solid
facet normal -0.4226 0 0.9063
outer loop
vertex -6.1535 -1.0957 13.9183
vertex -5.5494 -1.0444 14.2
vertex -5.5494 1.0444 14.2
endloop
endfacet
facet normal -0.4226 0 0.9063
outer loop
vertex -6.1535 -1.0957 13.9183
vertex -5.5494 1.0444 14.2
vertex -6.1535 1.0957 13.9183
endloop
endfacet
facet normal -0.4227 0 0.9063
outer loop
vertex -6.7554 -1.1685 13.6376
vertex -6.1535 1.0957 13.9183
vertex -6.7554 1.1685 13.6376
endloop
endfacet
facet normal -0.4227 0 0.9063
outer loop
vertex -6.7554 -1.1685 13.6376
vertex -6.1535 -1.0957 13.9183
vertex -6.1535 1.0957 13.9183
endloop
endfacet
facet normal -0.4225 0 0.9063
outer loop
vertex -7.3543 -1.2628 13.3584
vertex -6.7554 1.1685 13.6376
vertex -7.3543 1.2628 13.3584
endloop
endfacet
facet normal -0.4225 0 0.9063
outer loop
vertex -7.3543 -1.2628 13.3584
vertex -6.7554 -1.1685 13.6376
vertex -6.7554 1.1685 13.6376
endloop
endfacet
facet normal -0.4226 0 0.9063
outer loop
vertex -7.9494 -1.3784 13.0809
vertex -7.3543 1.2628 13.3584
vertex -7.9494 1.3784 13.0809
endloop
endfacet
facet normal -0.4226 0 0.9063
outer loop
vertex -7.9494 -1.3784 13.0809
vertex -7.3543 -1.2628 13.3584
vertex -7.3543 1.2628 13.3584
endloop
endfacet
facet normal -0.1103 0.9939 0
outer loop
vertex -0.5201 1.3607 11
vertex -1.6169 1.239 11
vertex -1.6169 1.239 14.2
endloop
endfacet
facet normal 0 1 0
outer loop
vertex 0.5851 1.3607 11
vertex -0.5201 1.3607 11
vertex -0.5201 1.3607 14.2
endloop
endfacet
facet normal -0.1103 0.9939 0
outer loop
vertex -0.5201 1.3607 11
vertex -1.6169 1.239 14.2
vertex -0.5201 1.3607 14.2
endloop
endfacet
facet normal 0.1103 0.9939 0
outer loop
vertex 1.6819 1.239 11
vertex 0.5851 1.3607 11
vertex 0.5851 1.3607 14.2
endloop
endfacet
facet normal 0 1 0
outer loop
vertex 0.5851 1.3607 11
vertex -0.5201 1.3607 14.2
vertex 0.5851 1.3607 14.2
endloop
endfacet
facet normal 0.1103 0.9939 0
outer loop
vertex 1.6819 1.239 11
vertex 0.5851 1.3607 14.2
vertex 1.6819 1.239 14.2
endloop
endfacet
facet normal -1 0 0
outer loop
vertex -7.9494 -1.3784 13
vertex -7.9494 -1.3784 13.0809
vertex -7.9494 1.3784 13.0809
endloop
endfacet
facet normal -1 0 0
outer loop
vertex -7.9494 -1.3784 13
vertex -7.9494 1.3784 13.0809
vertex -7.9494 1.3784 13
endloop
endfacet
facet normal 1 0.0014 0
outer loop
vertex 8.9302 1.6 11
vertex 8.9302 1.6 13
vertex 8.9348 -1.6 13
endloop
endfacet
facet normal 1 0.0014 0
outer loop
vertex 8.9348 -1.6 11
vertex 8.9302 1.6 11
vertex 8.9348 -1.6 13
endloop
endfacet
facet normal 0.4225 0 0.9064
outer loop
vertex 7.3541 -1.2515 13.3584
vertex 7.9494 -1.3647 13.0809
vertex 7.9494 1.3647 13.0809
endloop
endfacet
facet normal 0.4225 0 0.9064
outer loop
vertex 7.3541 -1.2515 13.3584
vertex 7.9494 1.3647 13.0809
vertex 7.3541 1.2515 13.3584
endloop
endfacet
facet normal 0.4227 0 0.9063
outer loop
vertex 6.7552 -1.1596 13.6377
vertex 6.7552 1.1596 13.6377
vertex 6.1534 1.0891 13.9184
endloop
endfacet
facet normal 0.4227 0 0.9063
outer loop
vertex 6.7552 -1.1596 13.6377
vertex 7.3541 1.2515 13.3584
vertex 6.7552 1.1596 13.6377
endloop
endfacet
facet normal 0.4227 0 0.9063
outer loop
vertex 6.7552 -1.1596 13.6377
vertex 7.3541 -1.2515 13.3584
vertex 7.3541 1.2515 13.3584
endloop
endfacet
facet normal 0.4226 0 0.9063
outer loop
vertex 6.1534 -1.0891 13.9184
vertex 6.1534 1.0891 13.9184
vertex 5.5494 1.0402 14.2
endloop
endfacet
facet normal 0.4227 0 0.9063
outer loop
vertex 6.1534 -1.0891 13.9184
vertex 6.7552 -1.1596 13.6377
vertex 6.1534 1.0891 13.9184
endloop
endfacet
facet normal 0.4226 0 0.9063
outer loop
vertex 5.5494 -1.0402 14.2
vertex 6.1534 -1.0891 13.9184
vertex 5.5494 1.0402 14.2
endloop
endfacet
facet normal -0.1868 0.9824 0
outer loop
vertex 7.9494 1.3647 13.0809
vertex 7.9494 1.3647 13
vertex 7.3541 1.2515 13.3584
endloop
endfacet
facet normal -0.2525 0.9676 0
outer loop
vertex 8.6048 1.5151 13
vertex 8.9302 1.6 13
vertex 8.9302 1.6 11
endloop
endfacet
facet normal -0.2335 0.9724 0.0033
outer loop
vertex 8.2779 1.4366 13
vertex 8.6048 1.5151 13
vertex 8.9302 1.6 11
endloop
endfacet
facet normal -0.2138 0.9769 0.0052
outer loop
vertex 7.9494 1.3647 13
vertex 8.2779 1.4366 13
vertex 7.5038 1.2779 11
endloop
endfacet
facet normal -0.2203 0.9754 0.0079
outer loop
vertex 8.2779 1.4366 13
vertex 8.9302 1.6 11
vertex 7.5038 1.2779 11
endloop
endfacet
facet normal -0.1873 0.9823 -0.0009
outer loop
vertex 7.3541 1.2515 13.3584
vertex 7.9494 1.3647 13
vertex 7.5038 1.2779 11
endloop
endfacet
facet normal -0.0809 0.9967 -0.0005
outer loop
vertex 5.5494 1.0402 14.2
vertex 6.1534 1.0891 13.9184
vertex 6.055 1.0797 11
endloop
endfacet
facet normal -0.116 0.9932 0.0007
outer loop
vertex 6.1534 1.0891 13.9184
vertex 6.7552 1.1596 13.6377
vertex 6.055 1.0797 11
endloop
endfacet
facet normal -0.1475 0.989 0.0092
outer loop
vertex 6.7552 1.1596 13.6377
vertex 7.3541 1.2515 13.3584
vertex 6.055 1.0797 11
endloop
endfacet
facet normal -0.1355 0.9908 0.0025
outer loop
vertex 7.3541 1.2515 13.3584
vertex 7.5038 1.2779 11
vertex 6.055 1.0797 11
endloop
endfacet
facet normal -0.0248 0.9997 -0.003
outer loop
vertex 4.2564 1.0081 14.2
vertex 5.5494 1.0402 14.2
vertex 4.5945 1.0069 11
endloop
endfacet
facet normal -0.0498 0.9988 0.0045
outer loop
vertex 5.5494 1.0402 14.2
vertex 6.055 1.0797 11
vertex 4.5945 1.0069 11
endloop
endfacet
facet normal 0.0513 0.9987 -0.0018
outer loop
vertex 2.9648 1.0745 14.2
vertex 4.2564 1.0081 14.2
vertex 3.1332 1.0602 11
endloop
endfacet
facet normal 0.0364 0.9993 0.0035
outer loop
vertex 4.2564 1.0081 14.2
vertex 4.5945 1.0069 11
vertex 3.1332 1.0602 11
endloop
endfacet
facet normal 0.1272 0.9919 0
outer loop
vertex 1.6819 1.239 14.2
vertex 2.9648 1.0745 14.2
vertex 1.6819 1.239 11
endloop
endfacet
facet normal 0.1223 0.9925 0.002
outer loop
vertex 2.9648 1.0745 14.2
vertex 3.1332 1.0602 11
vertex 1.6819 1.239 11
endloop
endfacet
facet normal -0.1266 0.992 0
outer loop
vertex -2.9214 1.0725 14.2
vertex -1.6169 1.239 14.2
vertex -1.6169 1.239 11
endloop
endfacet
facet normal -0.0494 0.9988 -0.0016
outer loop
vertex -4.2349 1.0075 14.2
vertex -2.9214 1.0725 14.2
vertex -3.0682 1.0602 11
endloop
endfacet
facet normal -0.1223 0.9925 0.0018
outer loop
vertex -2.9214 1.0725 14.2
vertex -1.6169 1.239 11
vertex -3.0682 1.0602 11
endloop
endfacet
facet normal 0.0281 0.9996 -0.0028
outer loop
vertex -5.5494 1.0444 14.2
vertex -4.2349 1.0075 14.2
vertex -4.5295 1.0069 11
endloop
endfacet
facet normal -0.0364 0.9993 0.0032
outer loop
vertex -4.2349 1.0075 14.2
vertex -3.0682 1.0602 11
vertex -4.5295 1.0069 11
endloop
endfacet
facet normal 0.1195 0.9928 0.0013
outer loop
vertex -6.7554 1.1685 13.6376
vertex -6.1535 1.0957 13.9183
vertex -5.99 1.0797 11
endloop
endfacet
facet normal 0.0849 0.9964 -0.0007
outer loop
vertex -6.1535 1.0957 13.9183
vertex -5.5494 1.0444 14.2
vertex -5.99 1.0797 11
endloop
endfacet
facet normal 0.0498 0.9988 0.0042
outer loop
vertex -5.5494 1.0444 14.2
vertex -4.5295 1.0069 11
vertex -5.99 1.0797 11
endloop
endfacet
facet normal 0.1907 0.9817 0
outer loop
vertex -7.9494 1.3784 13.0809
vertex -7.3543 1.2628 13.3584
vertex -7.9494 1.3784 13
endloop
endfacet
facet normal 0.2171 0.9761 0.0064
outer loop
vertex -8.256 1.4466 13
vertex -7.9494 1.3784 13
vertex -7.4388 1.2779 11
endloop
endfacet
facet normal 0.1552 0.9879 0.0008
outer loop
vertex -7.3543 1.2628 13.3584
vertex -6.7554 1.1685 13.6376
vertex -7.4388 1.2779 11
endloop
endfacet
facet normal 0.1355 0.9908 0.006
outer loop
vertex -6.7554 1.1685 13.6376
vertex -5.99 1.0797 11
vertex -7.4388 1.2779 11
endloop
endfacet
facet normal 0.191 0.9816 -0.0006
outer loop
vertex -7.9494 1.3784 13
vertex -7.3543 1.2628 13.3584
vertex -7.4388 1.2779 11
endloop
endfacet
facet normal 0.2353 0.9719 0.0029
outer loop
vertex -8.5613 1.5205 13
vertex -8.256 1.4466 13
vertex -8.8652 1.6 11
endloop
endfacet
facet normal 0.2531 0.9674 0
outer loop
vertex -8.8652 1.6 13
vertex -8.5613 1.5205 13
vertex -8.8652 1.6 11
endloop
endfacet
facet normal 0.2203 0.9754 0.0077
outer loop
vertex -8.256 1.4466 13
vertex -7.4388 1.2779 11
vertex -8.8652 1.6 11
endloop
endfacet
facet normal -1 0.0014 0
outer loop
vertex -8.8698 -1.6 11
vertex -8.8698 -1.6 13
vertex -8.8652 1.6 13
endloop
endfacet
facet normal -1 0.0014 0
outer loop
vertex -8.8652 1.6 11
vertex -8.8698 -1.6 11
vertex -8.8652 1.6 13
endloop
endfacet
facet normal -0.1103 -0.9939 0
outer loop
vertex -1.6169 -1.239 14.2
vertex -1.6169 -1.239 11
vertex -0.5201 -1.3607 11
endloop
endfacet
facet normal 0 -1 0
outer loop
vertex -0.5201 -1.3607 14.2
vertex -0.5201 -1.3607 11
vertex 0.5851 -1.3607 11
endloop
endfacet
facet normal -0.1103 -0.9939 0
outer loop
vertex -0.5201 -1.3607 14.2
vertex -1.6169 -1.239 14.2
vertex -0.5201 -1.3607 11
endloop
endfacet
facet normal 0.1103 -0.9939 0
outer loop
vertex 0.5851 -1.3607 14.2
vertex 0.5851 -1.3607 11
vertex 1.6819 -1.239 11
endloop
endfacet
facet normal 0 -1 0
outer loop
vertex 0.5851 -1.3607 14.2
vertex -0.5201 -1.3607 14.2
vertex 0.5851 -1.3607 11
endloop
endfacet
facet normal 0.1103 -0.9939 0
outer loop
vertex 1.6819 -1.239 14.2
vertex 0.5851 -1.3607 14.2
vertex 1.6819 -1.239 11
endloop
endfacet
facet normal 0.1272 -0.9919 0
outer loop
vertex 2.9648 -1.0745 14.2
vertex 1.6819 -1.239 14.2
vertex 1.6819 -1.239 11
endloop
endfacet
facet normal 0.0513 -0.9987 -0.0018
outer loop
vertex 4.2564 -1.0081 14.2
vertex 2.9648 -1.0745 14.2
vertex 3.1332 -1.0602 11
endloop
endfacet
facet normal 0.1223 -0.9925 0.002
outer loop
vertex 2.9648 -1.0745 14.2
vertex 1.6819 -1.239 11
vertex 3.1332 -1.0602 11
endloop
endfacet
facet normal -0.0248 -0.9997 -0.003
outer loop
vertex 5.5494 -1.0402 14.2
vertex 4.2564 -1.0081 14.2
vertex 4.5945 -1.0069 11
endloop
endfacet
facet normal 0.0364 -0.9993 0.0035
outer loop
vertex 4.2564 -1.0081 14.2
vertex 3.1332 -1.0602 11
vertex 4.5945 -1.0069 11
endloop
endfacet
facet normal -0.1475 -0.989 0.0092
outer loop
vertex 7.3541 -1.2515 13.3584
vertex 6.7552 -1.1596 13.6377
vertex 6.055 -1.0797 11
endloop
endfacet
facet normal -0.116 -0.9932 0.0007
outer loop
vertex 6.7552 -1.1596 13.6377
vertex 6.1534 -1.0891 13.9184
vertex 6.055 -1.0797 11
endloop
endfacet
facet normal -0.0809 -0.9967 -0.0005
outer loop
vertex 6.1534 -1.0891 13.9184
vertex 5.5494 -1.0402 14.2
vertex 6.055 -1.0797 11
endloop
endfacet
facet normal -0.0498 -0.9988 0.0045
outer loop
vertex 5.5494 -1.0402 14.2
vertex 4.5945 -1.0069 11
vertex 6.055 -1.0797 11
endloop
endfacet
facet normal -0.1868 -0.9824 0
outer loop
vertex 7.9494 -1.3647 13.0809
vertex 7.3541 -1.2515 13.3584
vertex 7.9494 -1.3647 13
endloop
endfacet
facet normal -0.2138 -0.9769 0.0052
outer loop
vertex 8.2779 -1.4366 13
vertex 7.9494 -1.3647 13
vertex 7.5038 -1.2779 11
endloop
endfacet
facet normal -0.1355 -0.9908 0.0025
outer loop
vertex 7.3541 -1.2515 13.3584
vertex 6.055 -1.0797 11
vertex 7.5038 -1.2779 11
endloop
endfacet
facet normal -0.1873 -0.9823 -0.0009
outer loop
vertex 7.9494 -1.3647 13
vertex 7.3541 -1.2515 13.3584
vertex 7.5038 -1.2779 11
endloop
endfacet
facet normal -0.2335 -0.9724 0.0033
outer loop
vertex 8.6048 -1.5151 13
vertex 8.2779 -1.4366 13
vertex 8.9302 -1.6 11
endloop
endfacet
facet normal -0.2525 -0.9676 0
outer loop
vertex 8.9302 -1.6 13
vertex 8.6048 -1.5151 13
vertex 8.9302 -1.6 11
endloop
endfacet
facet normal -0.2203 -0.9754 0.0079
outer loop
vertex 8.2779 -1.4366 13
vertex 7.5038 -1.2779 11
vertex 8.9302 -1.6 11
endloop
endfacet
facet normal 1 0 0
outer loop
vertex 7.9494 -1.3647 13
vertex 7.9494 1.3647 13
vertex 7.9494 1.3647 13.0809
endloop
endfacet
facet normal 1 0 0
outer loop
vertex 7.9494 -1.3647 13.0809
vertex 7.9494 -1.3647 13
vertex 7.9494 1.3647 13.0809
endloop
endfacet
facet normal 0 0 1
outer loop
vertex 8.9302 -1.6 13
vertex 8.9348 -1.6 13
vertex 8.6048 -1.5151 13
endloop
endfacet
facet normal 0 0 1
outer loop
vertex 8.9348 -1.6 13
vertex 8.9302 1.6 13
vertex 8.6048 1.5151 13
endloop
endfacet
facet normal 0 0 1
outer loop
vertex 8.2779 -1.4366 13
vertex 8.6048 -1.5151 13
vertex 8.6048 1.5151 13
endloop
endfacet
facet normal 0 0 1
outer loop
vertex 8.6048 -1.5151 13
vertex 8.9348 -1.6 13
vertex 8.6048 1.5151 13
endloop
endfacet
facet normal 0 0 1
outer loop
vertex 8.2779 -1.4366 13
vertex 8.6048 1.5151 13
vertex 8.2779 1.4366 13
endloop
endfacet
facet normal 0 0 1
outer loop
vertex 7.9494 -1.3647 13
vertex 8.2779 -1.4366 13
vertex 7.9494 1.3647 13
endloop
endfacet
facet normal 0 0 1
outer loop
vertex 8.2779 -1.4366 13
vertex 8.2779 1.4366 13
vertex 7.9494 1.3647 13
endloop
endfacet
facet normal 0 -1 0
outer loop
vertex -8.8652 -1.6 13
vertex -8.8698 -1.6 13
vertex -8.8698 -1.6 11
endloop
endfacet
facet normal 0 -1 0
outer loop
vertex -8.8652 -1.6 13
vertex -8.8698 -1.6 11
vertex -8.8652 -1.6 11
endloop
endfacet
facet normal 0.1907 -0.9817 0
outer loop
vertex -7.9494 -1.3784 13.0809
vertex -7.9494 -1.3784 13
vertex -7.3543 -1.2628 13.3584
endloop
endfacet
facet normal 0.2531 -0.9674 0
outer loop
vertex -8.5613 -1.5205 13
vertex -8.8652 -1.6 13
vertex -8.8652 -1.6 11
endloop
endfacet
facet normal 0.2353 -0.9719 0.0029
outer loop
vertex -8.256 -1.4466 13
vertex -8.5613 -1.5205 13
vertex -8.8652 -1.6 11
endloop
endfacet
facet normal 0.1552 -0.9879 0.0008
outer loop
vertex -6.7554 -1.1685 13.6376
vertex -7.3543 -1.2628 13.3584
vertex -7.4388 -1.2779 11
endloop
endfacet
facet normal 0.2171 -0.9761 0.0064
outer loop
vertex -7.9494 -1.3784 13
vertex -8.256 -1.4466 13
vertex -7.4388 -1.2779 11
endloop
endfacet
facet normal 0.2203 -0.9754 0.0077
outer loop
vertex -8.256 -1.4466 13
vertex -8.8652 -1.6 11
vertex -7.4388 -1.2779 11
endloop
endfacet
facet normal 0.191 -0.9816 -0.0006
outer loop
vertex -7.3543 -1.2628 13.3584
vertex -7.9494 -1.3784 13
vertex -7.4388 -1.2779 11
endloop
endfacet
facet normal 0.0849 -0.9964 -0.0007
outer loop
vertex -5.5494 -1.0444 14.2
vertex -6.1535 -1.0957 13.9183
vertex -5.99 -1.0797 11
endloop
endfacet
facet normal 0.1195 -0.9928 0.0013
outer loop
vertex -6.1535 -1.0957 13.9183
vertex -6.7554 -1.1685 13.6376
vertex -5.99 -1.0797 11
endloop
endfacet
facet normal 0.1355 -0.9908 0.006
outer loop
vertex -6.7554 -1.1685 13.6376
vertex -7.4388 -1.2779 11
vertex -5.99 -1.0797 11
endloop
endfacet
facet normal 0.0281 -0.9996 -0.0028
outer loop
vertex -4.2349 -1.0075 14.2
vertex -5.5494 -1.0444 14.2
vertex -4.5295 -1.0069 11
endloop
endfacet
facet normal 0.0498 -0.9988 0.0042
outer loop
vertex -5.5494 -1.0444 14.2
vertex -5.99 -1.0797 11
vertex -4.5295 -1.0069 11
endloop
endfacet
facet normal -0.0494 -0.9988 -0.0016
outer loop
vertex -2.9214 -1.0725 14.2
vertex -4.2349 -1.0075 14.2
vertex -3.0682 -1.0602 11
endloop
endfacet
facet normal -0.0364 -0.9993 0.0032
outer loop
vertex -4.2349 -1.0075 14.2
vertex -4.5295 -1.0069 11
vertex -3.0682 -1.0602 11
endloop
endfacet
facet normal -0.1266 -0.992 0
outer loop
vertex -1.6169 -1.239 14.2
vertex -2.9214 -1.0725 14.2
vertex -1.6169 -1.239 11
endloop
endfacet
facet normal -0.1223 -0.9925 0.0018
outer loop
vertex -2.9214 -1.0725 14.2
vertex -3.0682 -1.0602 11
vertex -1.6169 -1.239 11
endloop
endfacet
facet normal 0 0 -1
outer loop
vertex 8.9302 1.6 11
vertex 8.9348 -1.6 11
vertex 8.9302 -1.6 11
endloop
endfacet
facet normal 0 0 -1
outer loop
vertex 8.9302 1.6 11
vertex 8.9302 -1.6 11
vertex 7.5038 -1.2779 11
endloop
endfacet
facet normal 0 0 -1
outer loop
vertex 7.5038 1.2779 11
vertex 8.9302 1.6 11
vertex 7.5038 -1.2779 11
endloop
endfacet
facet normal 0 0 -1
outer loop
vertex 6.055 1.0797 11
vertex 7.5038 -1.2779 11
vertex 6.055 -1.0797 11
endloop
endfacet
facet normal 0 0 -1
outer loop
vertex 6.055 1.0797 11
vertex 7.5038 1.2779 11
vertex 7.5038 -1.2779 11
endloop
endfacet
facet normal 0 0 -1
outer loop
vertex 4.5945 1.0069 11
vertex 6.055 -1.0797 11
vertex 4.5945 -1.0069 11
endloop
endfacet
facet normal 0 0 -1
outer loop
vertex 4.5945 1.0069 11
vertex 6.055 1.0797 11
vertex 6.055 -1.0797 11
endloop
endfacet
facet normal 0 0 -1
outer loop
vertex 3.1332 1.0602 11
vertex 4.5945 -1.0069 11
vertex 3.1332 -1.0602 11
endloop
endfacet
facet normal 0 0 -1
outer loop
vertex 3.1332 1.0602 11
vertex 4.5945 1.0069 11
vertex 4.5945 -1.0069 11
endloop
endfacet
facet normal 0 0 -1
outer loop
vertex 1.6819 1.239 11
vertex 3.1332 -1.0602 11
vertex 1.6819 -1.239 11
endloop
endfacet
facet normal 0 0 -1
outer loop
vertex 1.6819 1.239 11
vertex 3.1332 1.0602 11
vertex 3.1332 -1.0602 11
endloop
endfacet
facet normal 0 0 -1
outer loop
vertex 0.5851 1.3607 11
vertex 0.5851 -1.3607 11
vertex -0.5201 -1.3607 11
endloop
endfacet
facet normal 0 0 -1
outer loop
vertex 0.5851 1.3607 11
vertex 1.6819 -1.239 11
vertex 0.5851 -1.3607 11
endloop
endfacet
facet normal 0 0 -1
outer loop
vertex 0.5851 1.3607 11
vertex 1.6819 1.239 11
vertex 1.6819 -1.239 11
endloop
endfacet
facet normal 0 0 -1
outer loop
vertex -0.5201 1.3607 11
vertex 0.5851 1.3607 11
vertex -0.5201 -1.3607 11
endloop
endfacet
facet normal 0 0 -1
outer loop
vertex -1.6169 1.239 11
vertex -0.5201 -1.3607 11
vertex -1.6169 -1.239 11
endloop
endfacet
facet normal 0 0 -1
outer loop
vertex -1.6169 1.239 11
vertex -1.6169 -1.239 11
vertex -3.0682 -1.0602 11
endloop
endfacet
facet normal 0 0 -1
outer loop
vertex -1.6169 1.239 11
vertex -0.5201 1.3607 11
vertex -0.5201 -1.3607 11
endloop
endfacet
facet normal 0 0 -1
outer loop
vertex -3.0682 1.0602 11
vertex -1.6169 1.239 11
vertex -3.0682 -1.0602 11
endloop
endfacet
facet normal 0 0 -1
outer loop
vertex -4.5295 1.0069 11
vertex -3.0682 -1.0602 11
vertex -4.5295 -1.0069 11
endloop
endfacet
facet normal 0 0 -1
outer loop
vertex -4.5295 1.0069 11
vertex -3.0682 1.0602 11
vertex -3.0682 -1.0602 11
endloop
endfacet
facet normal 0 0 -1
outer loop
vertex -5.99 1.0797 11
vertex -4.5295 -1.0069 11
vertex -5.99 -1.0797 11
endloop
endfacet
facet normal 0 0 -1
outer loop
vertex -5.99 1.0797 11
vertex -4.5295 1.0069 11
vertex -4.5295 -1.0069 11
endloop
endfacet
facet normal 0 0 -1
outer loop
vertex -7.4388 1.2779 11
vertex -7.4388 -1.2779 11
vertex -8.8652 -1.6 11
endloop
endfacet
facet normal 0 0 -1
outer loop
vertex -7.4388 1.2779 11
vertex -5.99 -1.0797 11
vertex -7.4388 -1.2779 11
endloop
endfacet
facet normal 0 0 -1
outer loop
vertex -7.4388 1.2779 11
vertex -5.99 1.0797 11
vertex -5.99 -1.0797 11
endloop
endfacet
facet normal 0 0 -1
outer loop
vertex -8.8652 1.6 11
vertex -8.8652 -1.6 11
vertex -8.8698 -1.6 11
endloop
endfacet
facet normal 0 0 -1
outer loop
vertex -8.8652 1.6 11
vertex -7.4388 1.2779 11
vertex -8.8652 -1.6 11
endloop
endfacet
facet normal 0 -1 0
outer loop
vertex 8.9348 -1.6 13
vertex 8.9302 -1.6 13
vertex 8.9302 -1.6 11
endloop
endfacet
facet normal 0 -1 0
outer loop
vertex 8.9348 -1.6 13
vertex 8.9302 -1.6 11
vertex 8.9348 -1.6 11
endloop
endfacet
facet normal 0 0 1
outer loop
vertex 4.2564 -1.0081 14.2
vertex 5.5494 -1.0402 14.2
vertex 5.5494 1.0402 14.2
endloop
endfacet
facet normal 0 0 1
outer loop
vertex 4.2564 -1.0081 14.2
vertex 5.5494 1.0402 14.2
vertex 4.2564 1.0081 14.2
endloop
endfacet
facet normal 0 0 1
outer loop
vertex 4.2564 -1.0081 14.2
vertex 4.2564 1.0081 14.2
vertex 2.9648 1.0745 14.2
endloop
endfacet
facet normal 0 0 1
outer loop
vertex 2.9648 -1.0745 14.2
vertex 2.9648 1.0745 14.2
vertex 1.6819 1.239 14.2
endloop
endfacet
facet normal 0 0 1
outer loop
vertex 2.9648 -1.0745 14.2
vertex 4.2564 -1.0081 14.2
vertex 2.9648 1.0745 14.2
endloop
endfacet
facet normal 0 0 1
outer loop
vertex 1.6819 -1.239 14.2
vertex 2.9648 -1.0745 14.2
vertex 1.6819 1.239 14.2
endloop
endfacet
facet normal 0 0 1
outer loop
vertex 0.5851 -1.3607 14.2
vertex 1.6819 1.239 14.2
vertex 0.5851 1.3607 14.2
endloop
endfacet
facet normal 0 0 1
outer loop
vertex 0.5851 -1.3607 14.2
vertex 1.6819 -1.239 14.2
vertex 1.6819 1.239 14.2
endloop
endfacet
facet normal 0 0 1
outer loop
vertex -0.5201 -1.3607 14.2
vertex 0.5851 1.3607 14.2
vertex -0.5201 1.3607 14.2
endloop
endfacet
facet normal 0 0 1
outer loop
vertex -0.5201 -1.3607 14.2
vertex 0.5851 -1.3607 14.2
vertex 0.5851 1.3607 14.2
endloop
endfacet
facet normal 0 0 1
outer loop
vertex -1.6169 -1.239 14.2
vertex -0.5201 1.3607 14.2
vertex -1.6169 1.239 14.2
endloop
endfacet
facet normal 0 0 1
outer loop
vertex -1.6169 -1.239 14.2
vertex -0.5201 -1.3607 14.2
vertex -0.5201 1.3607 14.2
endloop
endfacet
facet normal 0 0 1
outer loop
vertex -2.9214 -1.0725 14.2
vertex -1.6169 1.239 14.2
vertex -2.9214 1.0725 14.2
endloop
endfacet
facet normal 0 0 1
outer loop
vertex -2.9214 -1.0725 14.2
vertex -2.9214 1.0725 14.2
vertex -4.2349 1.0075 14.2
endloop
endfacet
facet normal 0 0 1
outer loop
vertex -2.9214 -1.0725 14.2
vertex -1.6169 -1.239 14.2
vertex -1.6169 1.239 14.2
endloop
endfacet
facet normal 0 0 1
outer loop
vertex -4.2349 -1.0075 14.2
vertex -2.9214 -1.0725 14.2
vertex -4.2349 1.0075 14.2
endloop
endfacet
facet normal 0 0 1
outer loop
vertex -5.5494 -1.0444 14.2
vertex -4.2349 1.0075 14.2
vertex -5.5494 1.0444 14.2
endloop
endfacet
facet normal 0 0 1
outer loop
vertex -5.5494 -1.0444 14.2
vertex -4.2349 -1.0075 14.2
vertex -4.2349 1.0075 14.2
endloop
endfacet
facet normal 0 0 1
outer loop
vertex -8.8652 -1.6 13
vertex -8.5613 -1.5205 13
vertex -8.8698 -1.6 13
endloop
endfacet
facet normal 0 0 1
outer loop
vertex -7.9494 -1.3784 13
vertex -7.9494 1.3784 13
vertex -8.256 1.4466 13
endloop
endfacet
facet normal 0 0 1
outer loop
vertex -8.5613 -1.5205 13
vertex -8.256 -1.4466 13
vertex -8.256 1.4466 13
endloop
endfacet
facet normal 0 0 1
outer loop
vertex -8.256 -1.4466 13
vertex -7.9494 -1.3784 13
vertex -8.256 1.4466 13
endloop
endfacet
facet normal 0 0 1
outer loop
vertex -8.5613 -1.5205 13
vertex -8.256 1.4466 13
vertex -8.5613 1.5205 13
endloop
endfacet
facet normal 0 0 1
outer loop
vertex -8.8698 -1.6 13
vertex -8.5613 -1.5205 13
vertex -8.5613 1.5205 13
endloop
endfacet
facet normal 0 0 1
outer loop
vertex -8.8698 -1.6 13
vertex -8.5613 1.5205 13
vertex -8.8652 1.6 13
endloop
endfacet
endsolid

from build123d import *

# Parameters (mm, degrees)
BOSS_EXTRUDE1_DEPTH = 2
BOSS_EXTRUDE2_DEPTH = 3.2
CUT_EXTRUDE1_DEPTH  = 4.200000092
FILLET1_R           = 10


with BuildPart() as part:
    # Sketch3 → Boss-Extrude1 (new body)
    with BuildSketch(Plane.XY.offset(13)):
        Polygon((-3.57e-07, 1.6), (8.295592088, 1.6), (8.93017926, 1.6), (8.934835346, -1.6), (8.268122338, -1.6), (-8.285812718, -1.6), (-8.869806966, -1.6), (-8.865150879, 1.6), (-8.277696583, 1.6), align=None)
    extrude(amount=-BOSS_EXTRUDE1_DEPTH)

    # Sketch4 → Boss-Extrude2 (add)
    with BuildSketch(Plane.XZ.offset(1.6)):
        Polygon((-7.949410938, 13.000000268), (7.949410938, 13.000000268), (7.949410938, 13.080862351), (5.549410824, 14.200000092), (-5.549410824, 14.200000092), (-7.949410938, 13.080862351), align=None)
    extrude(amount=-BOSS_EXTRUDE2_DEPTH)

    # Sketch5 → Cut-Extrude1 (cut, through all)
    with BuildSketch(Plane(origin=(0, 0, 11), x_dir=(-1, 0, 0), z_dir=(0, 0, -1))):
        with BuildLine():
            ThreePointArc((-0.03251419, -1.6), (-4.481346725, -1.006559792), (-8.93017926, -1.6))
            Line((-8.93017926, -1.6), (-0.03251419, -1.6))
        make_face()
        with BuildLine():
            ThreePointArc((8.865150879, -1.6), (4.416318345, -1.006559792), (-0.03251419, -1.6))
            Line((-0.03251419, -1.6), (8.865150879, -1.6))
        make_face()
        with BuildLine():
            Line((8.865150879, 1.6), (-0.03251419, 1.6))
            ThreePointArc((-0.03251419, 1.6), (4.416318345, 1.006559792), (8.865150879, 1.6))
        make_face()
        with BuildLine():
            Line((-0.03251419, 1.6), (-8.93017926, 1.6))
            ThreePointArc((-8.93017926, 1.6), (-4.481346725, 1.006559792), (-0.03251419, 1.6))
        make_face()
    extrude(amount=-CUT_EXTRUDE1_DEPTH, mode=Mode.SUBTRACT)

    # Fillet1
    fillet1_edges = [part.edges().sort_by_distance(p)[0] for p in [
        (0.03251419, -1.6, 12.600000046),
        (0.03251419, 1.6, 12.600000046),
    ]]
    fillet(fillet1_edges, radius=FILLET1_R)


solid = part.part
